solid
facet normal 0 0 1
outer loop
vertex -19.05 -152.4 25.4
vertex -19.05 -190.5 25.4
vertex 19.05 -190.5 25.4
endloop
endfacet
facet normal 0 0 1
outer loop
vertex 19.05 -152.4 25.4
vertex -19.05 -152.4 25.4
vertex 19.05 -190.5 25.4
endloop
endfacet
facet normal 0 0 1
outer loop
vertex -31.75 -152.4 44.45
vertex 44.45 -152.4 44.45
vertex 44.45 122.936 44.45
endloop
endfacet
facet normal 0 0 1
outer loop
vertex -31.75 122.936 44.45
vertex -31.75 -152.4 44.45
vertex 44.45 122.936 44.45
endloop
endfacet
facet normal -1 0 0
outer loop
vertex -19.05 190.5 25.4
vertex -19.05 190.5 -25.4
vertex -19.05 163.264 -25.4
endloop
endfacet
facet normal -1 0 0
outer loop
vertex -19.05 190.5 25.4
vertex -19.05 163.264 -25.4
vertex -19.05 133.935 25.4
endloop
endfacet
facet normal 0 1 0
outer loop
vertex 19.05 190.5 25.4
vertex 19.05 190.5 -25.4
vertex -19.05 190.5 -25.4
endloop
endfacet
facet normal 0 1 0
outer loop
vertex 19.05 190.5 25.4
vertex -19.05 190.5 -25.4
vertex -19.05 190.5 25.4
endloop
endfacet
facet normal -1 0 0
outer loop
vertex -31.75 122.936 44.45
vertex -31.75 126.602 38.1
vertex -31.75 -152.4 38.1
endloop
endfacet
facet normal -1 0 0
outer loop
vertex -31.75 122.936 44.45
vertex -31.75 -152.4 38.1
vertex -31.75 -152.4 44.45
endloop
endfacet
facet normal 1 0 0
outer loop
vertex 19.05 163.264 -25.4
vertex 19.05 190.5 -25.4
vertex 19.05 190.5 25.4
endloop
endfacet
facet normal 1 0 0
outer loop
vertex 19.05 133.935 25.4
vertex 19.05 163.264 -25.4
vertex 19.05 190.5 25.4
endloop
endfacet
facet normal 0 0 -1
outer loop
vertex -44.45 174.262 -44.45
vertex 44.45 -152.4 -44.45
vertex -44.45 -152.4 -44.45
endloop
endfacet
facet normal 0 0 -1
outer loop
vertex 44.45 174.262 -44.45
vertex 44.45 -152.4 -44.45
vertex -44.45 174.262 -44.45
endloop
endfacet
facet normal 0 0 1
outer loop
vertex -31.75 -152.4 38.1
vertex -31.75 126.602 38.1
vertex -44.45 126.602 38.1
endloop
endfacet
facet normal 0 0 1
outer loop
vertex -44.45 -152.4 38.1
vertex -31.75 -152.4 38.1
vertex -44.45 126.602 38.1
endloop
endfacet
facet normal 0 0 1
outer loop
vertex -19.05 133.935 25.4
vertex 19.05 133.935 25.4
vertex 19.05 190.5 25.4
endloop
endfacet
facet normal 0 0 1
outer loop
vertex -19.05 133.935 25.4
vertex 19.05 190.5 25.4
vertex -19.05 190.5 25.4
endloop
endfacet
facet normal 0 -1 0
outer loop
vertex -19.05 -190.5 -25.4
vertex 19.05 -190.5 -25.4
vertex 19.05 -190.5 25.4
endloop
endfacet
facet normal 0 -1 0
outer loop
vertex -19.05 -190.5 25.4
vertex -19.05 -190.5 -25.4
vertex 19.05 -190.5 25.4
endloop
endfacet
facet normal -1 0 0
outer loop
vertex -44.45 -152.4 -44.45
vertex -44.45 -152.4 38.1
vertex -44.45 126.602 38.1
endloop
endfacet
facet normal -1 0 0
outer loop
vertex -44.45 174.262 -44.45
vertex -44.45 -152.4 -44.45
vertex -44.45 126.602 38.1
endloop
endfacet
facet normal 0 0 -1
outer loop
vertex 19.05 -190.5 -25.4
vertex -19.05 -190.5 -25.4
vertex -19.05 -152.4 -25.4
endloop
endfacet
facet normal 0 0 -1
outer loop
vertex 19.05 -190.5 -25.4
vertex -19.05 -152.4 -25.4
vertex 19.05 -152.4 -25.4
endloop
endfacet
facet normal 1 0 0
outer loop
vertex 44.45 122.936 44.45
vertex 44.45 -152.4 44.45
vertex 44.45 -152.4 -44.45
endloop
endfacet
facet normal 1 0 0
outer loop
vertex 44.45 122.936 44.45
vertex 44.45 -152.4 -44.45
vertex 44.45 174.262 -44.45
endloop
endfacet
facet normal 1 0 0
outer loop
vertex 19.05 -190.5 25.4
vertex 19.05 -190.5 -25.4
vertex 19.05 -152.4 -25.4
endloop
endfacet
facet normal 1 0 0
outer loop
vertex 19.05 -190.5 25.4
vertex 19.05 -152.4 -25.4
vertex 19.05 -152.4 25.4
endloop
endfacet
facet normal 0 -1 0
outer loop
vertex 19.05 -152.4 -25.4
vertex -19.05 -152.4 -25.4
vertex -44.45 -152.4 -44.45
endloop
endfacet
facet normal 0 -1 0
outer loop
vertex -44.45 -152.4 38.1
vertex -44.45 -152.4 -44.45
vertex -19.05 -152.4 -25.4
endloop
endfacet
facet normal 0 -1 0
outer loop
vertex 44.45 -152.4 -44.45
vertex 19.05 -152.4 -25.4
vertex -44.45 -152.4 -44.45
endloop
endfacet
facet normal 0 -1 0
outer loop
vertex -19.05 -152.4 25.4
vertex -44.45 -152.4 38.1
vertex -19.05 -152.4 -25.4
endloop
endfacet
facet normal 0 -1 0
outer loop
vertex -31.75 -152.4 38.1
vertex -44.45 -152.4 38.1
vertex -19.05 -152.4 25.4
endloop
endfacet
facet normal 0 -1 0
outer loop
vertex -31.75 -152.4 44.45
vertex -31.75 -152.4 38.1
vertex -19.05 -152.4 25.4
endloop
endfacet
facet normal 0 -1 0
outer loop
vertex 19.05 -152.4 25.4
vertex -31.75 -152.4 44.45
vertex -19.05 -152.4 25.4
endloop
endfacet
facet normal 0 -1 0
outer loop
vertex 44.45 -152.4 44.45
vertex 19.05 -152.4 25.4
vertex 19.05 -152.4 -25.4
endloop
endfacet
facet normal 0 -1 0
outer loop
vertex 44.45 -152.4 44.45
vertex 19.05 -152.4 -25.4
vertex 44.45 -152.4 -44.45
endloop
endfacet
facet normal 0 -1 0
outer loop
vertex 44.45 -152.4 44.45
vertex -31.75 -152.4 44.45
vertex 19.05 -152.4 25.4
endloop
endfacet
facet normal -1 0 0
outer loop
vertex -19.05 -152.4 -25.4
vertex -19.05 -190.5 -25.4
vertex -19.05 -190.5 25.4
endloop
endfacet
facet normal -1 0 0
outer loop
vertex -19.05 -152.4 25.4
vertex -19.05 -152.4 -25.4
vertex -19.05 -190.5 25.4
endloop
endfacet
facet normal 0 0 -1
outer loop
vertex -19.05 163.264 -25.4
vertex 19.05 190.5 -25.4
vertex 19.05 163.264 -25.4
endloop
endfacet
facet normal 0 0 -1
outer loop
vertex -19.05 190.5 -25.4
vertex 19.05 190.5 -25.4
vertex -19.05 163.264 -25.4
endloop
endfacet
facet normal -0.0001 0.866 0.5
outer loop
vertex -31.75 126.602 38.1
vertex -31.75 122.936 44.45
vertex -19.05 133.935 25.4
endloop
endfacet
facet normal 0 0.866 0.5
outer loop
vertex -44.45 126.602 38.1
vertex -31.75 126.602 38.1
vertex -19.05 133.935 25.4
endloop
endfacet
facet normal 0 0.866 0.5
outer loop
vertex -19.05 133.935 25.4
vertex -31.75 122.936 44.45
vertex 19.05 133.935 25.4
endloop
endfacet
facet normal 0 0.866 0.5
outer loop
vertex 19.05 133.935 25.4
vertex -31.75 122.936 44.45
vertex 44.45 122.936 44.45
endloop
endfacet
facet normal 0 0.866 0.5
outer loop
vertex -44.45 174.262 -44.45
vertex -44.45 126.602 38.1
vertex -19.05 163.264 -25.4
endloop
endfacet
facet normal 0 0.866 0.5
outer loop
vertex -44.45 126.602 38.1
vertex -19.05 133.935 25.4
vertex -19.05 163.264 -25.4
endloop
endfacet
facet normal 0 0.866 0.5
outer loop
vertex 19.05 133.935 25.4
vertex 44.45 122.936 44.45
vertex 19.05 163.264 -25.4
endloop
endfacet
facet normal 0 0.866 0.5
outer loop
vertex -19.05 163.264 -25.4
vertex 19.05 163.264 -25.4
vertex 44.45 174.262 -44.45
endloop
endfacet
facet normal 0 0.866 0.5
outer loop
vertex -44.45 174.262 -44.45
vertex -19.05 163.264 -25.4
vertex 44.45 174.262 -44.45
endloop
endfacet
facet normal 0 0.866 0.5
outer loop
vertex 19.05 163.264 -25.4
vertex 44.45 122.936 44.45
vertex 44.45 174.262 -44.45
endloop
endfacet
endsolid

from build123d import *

# Parameters (mm, degrees)
F0_W     = 381
F0_H     = 88.9
F1_DEPTH = 44.45
F5_W     = 12.7
F5_H     = 6.35
F6_DEPTH = 381.001
F4_W     = 88.9
F4_H     = 88.9
F4_W_2   = 38.1
F4_H_2   = 50.8
F7_REACH = 193.287585695
F8_W     = 88.9
F8_H     = 88.9
F8_W_2   = 38.1
F8_H_2   = 50.8
F9_DEPTH = 38.1


with BuildPart() as f1:
    # F0 (on Right) → F1 (new body, symmetric)
    with BuildSketch(Plane.YZ):
        Rectangle(F0_W, F0_H)
    extrude(amount=F1_DEPTH, both=True)

    # F5 (on face) → F6 (cut, through all)
    with BuildSketch(Plane(origin=(0, 190.5, 0), x_dir=(-1, 0, 0), z_dir=(0, 1, 0))):
        with Locations((38.1, 41.275)):
            Rectangle(F5_W, F5_H)
    extrude(amount=-F6_DEPTH, mode=Mode.SUBTRACT)

    f7_end = Plane(origin=(0, 111.4494145991, 64.3453495198), x_dir=(0, 0.5, -0.8660254038), z_dir=(0, -0.8660254038, -0.5))
    # F4 (on face) → F7 (cut, up to a plane its end follows)
    with BuildSketch(Plane(origin=(0, 190.5, 0), x_dir=(-1, 0, 0), z_dir=(0, 1, 0))):
        Rectangle(F4_W, F4_H)
        Rectangle(F4_W_2, F4_H_2, mode=Mode.SUBTRACT)
    f7_long = extrude(amount=-F7_REACH, mode=Mode.PRIVATE)
    add(split(f7_long, bisect_by=f7_end, keep=Keep.BOTTOM, mode=Mode.PRIVATE), mode=Mode.SUBTRACT)

    # F8 (on face) → F9 (cut)
    with BuildSketch(Plane.XZ.offset(190.5)):
        Rectangle(F8_W, F8_H)
        Rectangle(F8_W_2, F8_H_2, mode=Mode.SUBTRACT)
    extrude(amount=-F9_DEPTH, mode=Mode.SUBTRACT)


solid = f1.part
